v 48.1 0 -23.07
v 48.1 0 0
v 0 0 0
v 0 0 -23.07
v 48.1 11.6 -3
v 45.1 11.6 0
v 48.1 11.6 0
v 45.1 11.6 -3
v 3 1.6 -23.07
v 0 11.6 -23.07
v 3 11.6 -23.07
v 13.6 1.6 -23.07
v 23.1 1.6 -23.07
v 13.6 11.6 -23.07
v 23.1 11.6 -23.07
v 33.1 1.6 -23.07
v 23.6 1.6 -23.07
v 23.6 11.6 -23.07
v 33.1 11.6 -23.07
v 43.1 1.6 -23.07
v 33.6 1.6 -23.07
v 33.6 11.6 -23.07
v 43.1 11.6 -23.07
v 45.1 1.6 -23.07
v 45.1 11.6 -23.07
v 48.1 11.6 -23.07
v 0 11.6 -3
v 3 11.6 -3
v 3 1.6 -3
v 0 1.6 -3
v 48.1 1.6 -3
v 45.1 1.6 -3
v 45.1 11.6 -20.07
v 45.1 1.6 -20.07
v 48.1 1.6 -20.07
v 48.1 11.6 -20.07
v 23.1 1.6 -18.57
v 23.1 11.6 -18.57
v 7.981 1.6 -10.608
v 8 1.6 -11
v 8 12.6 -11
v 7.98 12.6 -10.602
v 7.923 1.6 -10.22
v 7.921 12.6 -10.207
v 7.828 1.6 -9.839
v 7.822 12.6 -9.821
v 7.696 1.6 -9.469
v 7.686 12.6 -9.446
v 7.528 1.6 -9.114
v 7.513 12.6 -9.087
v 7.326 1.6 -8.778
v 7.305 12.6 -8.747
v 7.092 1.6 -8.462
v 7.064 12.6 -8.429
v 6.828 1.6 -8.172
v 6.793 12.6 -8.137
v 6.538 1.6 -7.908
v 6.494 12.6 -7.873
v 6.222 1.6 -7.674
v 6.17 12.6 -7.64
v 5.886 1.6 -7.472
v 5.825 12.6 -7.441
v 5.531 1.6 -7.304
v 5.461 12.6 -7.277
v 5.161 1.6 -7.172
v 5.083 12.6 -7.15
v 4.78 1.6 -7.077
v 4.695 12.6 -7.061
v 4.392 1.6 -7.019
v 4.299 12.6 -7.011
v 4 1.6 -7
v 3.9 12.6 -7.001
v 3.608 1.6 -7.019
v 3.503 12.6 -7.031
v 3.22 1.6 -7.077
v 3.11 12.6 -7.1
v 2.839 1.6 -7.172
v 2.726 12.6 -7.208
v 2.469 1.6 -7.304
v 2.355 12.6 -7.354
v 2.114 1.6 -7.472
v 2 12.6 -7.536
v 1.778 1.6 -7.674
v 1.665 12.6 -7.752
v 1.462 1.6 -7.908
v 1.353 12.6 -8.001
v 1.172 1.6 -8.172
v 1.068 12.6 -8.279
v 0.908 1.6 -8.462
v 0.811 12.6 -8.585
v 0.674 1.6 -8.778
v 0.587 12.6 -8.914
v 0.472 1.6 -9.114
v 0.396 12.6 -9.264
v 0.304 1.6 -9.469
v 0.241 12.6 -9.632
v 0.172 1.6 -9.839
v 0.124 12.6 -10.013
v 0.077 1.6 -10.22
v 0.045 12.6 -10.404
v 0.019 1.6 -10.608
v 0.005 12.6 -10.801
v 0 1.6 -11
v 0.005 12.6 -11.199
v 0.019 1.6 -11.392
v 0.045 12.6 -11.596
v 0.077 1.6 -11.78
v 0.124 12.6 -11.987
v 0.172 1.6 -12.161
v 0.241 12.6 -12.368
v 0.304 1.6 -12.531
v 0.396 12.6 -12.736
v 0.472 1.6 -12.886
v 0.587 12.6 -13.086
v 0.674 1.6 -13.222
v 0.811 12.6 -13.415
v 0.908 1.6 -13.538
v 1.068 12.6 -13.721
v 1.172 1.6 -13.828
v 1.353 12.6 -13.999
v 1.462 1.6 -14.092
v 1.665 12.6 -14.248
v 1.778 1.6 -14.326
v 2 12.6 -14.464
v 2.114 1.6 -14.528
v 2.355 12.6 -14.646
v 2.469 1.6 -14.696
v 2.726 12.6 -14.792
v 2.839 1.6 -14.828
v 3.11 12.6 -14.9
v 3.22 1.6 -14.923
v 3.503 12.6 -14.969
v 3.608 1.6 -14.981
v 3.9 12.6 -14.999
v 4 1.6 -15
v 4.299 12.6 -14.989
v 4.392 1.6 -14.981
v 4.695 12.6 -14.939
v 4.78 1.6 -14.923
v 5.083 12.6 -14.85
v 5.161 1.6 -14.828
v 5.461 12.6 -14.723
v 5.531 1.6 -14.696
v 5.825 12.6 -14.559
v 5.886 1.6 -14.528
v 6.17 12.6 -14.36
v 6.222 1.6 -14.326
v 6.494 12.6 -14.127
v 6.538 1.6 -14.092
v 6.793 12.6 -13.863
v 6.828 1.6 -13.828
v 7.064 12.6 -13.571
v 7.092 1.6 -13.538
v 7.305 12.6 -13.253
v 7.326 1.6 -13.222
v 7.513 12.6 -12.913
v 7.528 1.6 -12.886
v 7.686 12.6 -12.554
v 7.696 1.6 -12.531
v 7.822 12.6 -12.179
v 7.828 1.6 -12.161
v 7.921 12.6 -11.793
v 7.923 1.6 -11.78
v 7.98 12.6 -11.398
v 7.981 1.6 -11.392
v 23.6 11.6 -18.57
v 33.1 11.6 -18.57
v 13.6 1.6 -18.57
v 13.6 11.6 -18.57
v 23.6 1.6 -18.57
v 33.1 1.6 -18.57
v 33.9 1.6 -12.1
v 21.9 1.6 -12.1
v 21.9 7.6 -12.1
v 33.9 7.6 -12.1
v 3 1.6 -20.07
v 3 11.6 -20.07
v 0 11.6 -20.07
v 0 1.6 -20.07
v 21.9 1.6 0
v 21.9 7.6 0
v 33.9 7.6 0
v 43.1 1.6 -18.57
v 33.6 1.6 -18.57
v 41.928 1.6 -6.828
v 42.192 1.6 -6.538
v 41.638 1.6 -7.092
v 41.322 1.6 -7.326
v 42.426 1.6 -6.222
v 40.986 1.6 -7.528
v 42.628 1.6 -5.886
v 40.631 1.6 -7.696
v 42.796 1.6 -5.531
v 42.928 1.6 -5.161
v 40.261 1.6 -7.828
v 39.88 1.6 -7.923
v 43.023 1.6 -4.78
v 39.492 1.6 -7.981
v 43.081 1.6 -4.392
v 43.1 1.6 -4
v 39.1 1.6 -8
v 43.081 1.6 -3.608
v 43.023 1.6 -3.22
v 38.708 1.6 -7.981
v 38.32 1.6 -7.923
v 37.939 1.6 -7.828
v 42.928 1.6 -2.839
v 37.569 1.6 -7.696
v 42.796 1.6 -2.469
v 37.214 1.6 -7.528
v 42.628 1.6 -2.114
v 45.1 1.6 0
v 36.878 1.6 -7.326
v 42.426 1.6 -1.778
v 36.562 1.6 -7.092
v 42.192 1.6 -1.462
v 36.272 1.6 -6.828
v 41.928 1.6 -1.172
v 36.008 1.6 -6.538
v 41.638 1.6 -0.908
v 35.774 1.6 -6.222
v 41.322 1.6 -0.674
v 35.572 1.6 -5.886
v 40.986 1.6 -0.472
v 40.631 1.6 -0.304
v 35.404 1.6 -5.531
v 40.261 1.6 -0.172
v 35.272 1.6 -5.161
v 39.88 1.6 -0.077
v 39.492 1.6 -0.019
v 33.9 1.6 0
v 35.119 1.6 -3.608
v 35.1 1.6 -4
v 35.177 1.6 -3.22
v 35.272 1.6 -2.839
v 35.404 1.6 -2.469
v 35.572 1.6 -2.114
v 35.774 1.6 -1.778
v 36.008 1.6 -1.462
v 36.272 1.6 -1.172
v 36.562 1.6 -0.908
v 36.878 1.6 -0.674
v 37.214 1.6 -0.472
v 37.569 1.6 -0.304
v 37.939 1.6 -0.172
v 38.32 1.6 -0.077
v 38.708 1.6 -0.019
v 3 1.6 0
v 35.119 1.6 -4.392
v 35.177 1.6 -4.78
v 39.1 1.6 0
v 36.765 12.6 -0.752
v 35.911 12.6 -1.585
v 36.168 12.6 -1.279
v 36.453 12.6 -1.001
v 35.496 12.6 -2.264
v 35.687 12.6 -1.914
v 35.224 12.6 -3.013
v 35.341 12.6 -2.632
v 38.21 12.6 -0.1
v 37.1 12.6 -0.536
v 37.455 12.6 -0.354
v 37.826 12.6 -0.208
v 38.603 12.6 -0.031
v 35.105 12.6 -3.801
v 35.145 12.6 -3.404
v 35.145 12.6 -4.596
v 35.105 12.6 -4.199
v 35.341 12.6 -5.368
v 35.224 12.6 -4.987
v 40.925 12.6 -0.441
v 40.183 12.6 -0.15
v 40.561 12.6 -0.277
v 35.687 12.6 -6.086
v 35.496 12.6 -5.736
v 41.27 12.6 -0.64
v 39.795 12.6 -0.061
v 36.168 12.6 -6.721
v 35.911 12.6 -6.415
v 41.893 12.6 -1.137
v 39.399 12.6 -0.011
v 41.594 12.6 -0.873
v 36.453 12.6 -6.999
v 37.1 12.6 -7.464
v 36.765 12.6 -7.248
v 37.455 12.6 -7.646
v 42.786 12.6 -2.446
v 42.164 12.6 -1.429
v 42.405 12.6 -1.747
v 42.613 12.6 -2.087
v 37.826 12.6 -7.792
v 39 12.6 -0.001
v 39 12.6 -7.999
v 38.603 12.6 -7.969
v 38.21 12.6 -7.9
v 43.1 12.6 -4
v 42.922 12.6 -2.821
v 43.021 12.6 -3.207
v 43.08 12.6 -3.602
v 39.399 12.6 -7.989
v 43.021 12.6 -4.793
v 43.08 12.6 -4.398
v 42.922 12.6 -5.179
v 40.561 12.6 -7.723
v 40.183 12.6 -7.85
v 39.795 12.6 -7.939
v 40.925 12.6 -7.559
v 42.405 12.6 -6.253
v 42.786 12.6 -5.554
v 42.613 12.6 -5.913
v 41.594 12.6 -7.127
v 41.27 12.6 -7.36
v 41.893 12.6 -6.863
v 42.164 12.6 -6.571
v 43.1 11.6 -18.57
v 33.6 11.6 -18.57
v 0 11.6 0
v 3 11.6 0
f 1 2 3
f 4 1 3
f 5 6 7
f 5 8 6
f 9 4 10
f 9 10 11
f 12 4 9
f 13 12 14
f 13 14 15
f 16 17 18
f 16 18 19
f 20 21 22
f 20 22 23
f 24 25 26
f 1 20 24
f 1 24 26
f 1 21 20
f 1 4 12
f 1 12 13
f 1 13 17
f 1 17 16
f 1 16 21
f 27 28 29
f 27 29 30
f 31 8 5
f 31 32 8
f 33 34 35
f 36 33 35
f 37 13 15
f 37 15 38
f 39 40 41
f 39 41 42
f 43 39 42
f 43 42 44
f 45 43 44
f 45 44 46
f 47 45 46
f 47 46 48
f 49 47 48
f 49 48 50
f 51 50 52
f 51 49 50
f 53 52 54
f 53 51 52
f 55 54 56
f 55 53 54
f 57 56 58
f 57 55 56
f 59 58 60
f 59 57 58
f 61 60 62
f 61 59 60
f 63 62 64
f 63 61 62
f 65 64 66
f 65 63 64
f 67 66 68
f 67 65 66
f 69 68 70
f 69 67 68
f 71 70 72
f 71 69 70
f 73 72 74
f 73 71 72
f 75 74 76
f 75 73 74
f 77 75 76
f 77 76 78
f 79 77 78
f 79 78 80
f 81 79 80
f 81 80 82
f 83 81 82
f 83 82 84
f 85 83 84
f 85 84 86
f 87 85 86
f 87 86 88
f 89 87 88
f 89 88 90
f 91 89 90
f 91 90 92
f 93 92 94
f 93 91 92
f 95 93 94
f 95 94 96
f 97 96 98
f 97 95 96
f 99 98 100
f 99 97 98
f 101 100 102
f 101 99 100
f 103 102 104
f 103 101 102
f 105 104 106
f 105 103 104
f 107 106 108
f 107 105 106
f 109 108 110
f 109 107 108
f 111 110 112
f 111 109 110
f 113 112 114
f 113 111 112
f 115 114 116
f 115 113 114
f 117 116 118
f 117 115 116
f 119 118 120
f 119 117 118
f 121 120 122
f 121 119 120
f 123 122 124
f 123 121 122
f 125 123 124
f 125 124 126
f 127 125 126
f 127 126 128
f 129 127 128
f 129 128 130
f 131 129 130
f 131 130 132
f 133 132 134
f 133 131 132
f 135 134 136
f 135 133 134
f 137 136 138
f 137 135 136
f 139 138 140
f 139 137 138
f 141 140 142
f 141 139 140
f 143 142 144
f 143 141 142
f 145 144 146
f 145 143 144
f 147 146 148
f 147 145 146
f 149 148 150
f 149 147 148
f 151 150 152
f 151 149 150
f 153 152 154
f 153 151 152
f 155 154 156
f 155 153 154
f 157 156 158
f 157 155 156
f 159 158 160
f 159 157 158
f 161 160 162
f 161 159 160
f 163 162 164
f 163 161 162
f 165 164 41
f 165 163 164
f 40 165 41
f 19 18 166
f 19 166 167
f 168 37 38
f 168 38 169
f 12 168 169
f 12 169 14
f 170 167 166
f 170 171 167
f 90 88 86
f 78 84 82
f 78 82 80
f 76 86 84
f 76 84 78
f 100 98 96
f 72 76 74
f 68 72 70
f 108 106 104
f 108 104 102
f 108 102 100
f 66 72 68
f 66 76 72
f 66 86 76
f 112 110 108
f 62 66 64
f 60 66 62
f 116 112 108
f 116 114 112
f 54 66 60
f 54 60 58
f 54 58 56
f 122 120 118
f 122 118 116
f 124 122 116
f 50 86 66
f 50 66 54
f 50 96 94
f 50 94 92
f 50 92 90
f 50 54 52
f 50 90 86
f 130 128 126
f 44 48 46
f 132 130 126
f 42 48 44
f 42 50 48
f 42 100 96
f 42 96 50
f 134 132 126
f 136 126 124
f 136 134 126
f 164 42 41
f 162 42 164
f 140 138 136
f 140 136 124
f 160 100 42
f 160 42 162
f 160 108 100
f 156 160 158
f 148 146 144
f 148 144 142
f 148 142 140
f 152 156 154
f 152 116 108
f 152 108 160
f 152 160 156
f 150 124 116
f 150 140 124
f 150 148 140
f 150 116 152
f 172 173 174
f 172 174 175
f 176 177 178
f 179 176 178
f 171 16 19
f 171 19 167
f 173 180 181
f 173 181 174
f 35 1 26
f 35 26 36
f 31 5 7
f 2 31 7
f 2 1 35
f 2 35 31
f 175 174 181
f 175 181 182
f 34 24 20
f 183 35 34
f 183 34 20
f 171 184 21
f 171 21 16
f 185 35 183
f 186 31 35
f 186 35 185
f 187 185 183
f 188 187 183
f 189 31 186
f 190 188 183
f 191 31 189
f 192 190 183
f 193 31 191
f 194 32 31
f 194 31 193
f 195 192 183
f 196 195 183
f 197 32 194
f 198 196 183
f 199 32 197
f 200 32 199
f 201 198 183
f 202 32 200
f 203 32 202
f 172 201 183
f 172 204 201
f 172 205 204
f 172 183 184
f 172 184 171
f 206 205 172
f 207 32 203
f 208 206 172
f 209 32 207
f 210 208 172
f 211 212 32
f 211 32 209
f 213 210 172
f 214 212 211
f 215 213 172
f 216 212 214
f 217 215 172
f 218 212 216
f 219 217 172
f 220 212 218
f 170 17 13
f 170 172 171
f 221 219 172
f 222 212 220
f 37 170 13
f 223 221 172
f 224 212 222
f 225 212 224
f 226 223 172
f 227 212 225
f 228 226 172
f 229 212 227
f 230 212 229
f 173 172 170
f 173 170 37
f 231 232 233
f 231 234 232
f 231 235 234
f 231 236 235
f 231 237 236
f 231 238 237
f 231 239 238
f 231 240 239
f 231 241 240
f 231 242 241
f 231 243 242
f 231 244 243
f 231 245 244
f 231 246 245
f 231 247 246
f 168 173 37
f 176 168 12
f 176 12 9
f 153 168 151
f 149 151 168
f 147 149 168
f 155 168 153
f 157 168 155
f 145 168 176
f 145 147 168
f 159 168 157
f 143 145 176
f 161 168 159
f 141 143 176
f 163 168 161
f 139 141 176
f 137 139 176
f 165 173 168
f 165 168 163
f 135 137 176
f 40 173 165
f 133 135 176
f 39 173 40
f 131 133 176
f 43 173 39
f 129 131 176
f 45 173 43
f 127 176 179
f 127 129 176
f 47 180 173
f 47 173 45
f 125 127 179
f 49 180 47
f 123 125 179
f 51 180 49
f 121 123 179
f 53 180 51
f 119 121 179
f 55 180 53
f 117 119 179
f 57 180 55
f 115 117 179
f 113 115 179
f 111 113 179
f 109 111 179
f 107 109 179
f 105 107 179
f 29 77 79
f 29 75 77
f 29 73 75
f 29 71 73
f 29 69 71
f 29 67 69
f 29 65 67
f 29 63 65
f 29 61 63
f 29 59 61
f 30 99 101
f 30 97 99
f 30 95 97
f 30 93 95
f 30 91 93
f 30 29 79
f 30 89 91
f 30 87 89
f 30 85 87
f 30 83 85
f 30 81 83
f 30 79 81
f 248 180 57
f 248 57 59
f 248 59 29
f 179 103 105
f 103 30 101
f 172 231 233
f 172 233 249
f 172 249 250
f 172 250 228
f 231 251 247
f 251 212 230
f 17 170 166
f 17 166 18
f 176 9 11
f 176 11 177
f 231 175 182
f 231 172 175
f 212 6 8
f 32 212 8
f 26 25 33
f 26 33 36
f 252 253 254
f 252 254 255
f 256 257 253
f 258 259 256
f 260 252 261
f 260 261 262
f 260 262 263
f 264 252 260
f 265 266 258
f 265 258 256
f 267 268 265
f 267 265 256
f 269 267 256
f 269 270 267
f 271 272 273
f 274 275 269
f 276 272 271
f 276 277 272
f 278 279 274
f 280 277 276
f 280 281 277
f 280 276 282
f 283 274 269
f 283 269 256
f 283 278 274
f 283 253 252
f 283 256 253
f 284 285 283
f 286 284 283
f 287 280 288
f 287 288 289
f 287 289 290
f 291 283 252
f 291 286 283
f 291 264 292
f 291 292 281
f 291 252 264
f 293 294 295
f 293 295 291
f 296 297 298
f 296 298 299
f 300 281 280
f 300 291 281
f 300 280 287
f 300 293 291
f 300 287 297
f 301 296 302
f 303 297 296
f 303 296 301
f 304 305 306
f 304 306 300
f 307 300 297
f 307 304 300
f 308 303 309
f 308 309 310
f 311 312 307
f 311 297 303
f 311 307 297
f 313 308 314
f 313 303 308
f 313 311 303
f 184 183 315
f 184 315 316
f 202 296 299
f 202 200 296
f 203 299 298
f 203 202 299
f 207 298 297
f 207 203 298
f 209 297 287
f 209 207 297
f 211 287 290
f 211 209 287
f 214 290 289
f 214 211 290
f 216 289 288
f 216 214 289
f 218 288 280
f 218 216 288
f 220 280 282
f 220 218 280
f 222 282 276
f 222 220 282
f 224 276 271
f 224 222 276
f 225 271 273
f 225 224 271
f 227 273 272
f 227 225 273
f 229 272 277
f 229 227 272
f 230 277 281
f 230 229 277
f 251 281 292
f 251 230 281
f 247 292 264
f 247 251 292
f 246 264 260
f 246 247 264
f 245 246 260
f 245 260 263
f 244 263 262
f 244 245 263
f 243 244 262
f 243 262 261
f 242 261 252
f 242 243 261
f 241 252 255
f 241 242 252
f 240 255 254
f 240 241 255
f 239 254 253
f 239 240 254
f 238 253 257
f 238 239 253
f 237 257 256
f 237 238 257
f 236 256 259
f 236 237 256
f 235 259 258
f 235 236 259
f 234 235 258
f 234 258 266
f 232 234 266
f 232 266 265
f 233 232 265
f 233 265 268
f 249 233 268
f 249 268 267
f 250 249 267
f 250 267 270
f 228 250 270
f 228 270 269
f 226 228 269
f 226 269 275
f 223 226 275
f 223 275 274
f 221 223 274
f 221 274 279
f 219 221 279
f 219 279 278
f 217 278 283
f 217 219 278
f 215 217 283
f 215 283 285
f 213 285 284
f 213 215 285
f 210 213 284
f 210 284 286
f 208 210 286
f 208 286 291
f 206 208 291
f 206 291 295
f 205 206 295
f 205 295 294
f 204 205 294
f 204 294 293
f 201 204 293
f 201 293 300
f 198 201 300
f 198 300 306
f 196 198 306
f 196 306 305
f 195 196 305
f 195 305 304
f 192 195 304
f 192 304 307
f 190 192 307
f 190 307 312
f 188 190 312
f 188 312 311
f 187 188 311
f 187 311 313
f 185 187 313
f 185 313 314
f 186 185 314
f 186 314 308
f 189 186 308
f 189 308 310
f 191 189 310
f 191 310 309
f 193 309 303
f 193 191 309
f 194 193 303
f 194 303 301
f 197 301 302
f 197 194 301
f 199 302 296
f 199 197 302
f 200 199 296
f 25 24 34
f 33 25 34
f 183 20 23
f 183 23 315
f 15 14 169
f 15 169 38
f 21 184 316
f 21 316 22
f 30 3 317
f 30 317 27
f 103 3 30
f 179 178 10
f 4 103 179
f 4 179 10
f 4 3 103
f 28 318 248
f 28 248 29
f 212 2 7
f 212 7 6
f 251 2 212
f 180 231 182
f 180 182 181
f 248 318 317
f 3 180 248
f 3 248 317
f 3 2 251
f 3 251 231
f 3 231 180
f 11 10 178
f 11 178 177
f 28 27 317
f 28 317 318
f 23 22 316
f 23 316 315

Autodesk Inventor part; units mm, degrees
ref_plane "YZ Plane" through (0, 0, 0) normal (1, 0, 0) x (0, 1, 0)
ref_plane "XZ Plane" through (0, 0, 0) normal (0, 1, 0) x (-1, 0, 0)
ref_plane "XY Plane" through (0, 0, 0) normal (0, 0, 1) x (1, 0, 0)
sketch "Sketch1" plane through (0, 0, 0) normal (0, 1, 0) x (-1, 0, 0)
  line L0 (0, -23.07) -> (-48.1, -23.07)
  line L1 (-48.1, -23.07) -> (-48.1, 0)
  line L2 (-48.1, 0) -> (0, 0)
  line L3 (0, 0) -> (0, -23.07)
  point P0 (0, 0)
  dimension "d0" = 48.1
  dimension "d1" = 23.07
extrude "Extrusion1" add sketch "Sketch1" along normal blind 1.6
sketch "Sketch2" plane through (0, 1.6, 0) normal (0, 1, 0) x (1, 0, 0)
  line L0 (33.6, 23.07) -> (43.1, 23.07)
  line L1 (43.1, 23.07) -> (43.1, 18.57)
  line L2 (43.1, 18.57) -> (33.6, 18.57)
  line L3 (33.6, 18.57) -> (33.6, 23.07)
  line L4 (48.1, 23.07) -> (0, 23.07) projected
  line L5 (48.1, 0) -> (48.1, 23.07) projected
  line L6 (23.6, 23.07) -> (33.1, 23.07)
  line L7 (33.1, 23.07) -> (33.1, 18.57)
  line L8 (33.1, 18.57) -> (23.6, 18.57)
  line L9 (23.6, 18.57) -> (23.6, 23.07)
  line L10 (13.6, 23.07) -> (23.1, 23.07)
  line L11 (23.1, 23.07) -> (23.1, 18.57)
  line L12 (23.1, 18.57) -> (13.6, 18.57)
  line L13 (13.6, 18.57) -> (13.6, 23.07)
  point P0 (0, 0)
  dimension "d4" = 9.5
  dimension "d5" = 4.5
  dimension "d6" = 5
  dimension "d7" = 9.5
  dimension "d8" = 4.5
  dimension "d9" = 0.5
  dimension "d10" = 9.5
  dimension "d11" = 4.5
  dimension "d12" = 0.5
extrude "Extrusion2" add sketch "Sketch2" along normal blind 10
sketch "Sketch3" plane through (0, 1.6, 0) normal (0, 1, 0) x (1, 0, 0)
  line L0 (48.1, 0) -> (48.1, 23.07) projected
  line L1 (48.1, 23.07) -> (45.1, 23.07)
  line L2 (45.1, 23.07) -> (45.1, 20.07)
  line L3 (45.1, 20.07) -> (48.1, 20.07)
  line L4 (48.1, 20.07) -> (48.1, 23.07)
  line L5 (0, 23.07) -> (3, 23.07)
  line L6 (3, 23.07) -> (3, 20.07)
  line L7 (3, 20.07) -> (0, 20.07)
  line L8 (0, 20.07) -> (0, 23.07)
  line L9 (0, 0) -> (3, 0)
  line L10 (3, 0) -> (3, 3)
  line L11 (3, 3) -> (0, 3)
  line L12 (0, 3) -> (0, 0)
  line L13 (48.1, 0) -> (45.1, 0)
  line L14 (45.1, 0) -> (45.1, 3)
  line L15 (45.1, 3) -> (48.1, 3)
  line L16 (48.1, 3) -> (48.1, 0)
  dimension "d15" = 3
  dimension "d16" = 3
  dimension "d17" = 3
extrude "Extrusion3" add sketch "Sketch3" along normal blind 10
sketch "Sketch4" plane through (0, 1.6, 0) normal (0, 1, 0) x (1, 0, 0)
  circle A0 centre (39.1, 4) radius 4
  line L0 (48.1, 3) -> (48.1, 20.07) projected
  circle A1 centre (4, 11) radius 4
  point P0 (0, 0)
  dimension "d20" = 8
  dimension "d21" = 9
  dimension "d22" = 8
extrude "Extrusion4" add sketch "Sketch4" along normal blind 11
sketch "Sketch5" plane through (0, 1.6, 0) normal (0, 1, 0) x (1, 0, 0)
  line L0 (21.9, 12.1) -> (33.9, 12.1)
  line L1 (33.9, 12.1) -> (33.9, 0)
  line L2 (33.9, 0) -> (21.9, 0)
  line L3 (21.9, 0) -> (21.9, 12.1)
  circle A0 centre (39.1, 4) radius 4 projected
  point P0 (0, 0)
  dimension "d25" = 12
  dimension "d26" = 12.1
  dimension "d27" = 1.2
extrude "Extrusion5" add sketch "Sketch5" along normal blind 6 contours L0 L1 L2 L3
properties part number "LM2596 Buck Converter"
